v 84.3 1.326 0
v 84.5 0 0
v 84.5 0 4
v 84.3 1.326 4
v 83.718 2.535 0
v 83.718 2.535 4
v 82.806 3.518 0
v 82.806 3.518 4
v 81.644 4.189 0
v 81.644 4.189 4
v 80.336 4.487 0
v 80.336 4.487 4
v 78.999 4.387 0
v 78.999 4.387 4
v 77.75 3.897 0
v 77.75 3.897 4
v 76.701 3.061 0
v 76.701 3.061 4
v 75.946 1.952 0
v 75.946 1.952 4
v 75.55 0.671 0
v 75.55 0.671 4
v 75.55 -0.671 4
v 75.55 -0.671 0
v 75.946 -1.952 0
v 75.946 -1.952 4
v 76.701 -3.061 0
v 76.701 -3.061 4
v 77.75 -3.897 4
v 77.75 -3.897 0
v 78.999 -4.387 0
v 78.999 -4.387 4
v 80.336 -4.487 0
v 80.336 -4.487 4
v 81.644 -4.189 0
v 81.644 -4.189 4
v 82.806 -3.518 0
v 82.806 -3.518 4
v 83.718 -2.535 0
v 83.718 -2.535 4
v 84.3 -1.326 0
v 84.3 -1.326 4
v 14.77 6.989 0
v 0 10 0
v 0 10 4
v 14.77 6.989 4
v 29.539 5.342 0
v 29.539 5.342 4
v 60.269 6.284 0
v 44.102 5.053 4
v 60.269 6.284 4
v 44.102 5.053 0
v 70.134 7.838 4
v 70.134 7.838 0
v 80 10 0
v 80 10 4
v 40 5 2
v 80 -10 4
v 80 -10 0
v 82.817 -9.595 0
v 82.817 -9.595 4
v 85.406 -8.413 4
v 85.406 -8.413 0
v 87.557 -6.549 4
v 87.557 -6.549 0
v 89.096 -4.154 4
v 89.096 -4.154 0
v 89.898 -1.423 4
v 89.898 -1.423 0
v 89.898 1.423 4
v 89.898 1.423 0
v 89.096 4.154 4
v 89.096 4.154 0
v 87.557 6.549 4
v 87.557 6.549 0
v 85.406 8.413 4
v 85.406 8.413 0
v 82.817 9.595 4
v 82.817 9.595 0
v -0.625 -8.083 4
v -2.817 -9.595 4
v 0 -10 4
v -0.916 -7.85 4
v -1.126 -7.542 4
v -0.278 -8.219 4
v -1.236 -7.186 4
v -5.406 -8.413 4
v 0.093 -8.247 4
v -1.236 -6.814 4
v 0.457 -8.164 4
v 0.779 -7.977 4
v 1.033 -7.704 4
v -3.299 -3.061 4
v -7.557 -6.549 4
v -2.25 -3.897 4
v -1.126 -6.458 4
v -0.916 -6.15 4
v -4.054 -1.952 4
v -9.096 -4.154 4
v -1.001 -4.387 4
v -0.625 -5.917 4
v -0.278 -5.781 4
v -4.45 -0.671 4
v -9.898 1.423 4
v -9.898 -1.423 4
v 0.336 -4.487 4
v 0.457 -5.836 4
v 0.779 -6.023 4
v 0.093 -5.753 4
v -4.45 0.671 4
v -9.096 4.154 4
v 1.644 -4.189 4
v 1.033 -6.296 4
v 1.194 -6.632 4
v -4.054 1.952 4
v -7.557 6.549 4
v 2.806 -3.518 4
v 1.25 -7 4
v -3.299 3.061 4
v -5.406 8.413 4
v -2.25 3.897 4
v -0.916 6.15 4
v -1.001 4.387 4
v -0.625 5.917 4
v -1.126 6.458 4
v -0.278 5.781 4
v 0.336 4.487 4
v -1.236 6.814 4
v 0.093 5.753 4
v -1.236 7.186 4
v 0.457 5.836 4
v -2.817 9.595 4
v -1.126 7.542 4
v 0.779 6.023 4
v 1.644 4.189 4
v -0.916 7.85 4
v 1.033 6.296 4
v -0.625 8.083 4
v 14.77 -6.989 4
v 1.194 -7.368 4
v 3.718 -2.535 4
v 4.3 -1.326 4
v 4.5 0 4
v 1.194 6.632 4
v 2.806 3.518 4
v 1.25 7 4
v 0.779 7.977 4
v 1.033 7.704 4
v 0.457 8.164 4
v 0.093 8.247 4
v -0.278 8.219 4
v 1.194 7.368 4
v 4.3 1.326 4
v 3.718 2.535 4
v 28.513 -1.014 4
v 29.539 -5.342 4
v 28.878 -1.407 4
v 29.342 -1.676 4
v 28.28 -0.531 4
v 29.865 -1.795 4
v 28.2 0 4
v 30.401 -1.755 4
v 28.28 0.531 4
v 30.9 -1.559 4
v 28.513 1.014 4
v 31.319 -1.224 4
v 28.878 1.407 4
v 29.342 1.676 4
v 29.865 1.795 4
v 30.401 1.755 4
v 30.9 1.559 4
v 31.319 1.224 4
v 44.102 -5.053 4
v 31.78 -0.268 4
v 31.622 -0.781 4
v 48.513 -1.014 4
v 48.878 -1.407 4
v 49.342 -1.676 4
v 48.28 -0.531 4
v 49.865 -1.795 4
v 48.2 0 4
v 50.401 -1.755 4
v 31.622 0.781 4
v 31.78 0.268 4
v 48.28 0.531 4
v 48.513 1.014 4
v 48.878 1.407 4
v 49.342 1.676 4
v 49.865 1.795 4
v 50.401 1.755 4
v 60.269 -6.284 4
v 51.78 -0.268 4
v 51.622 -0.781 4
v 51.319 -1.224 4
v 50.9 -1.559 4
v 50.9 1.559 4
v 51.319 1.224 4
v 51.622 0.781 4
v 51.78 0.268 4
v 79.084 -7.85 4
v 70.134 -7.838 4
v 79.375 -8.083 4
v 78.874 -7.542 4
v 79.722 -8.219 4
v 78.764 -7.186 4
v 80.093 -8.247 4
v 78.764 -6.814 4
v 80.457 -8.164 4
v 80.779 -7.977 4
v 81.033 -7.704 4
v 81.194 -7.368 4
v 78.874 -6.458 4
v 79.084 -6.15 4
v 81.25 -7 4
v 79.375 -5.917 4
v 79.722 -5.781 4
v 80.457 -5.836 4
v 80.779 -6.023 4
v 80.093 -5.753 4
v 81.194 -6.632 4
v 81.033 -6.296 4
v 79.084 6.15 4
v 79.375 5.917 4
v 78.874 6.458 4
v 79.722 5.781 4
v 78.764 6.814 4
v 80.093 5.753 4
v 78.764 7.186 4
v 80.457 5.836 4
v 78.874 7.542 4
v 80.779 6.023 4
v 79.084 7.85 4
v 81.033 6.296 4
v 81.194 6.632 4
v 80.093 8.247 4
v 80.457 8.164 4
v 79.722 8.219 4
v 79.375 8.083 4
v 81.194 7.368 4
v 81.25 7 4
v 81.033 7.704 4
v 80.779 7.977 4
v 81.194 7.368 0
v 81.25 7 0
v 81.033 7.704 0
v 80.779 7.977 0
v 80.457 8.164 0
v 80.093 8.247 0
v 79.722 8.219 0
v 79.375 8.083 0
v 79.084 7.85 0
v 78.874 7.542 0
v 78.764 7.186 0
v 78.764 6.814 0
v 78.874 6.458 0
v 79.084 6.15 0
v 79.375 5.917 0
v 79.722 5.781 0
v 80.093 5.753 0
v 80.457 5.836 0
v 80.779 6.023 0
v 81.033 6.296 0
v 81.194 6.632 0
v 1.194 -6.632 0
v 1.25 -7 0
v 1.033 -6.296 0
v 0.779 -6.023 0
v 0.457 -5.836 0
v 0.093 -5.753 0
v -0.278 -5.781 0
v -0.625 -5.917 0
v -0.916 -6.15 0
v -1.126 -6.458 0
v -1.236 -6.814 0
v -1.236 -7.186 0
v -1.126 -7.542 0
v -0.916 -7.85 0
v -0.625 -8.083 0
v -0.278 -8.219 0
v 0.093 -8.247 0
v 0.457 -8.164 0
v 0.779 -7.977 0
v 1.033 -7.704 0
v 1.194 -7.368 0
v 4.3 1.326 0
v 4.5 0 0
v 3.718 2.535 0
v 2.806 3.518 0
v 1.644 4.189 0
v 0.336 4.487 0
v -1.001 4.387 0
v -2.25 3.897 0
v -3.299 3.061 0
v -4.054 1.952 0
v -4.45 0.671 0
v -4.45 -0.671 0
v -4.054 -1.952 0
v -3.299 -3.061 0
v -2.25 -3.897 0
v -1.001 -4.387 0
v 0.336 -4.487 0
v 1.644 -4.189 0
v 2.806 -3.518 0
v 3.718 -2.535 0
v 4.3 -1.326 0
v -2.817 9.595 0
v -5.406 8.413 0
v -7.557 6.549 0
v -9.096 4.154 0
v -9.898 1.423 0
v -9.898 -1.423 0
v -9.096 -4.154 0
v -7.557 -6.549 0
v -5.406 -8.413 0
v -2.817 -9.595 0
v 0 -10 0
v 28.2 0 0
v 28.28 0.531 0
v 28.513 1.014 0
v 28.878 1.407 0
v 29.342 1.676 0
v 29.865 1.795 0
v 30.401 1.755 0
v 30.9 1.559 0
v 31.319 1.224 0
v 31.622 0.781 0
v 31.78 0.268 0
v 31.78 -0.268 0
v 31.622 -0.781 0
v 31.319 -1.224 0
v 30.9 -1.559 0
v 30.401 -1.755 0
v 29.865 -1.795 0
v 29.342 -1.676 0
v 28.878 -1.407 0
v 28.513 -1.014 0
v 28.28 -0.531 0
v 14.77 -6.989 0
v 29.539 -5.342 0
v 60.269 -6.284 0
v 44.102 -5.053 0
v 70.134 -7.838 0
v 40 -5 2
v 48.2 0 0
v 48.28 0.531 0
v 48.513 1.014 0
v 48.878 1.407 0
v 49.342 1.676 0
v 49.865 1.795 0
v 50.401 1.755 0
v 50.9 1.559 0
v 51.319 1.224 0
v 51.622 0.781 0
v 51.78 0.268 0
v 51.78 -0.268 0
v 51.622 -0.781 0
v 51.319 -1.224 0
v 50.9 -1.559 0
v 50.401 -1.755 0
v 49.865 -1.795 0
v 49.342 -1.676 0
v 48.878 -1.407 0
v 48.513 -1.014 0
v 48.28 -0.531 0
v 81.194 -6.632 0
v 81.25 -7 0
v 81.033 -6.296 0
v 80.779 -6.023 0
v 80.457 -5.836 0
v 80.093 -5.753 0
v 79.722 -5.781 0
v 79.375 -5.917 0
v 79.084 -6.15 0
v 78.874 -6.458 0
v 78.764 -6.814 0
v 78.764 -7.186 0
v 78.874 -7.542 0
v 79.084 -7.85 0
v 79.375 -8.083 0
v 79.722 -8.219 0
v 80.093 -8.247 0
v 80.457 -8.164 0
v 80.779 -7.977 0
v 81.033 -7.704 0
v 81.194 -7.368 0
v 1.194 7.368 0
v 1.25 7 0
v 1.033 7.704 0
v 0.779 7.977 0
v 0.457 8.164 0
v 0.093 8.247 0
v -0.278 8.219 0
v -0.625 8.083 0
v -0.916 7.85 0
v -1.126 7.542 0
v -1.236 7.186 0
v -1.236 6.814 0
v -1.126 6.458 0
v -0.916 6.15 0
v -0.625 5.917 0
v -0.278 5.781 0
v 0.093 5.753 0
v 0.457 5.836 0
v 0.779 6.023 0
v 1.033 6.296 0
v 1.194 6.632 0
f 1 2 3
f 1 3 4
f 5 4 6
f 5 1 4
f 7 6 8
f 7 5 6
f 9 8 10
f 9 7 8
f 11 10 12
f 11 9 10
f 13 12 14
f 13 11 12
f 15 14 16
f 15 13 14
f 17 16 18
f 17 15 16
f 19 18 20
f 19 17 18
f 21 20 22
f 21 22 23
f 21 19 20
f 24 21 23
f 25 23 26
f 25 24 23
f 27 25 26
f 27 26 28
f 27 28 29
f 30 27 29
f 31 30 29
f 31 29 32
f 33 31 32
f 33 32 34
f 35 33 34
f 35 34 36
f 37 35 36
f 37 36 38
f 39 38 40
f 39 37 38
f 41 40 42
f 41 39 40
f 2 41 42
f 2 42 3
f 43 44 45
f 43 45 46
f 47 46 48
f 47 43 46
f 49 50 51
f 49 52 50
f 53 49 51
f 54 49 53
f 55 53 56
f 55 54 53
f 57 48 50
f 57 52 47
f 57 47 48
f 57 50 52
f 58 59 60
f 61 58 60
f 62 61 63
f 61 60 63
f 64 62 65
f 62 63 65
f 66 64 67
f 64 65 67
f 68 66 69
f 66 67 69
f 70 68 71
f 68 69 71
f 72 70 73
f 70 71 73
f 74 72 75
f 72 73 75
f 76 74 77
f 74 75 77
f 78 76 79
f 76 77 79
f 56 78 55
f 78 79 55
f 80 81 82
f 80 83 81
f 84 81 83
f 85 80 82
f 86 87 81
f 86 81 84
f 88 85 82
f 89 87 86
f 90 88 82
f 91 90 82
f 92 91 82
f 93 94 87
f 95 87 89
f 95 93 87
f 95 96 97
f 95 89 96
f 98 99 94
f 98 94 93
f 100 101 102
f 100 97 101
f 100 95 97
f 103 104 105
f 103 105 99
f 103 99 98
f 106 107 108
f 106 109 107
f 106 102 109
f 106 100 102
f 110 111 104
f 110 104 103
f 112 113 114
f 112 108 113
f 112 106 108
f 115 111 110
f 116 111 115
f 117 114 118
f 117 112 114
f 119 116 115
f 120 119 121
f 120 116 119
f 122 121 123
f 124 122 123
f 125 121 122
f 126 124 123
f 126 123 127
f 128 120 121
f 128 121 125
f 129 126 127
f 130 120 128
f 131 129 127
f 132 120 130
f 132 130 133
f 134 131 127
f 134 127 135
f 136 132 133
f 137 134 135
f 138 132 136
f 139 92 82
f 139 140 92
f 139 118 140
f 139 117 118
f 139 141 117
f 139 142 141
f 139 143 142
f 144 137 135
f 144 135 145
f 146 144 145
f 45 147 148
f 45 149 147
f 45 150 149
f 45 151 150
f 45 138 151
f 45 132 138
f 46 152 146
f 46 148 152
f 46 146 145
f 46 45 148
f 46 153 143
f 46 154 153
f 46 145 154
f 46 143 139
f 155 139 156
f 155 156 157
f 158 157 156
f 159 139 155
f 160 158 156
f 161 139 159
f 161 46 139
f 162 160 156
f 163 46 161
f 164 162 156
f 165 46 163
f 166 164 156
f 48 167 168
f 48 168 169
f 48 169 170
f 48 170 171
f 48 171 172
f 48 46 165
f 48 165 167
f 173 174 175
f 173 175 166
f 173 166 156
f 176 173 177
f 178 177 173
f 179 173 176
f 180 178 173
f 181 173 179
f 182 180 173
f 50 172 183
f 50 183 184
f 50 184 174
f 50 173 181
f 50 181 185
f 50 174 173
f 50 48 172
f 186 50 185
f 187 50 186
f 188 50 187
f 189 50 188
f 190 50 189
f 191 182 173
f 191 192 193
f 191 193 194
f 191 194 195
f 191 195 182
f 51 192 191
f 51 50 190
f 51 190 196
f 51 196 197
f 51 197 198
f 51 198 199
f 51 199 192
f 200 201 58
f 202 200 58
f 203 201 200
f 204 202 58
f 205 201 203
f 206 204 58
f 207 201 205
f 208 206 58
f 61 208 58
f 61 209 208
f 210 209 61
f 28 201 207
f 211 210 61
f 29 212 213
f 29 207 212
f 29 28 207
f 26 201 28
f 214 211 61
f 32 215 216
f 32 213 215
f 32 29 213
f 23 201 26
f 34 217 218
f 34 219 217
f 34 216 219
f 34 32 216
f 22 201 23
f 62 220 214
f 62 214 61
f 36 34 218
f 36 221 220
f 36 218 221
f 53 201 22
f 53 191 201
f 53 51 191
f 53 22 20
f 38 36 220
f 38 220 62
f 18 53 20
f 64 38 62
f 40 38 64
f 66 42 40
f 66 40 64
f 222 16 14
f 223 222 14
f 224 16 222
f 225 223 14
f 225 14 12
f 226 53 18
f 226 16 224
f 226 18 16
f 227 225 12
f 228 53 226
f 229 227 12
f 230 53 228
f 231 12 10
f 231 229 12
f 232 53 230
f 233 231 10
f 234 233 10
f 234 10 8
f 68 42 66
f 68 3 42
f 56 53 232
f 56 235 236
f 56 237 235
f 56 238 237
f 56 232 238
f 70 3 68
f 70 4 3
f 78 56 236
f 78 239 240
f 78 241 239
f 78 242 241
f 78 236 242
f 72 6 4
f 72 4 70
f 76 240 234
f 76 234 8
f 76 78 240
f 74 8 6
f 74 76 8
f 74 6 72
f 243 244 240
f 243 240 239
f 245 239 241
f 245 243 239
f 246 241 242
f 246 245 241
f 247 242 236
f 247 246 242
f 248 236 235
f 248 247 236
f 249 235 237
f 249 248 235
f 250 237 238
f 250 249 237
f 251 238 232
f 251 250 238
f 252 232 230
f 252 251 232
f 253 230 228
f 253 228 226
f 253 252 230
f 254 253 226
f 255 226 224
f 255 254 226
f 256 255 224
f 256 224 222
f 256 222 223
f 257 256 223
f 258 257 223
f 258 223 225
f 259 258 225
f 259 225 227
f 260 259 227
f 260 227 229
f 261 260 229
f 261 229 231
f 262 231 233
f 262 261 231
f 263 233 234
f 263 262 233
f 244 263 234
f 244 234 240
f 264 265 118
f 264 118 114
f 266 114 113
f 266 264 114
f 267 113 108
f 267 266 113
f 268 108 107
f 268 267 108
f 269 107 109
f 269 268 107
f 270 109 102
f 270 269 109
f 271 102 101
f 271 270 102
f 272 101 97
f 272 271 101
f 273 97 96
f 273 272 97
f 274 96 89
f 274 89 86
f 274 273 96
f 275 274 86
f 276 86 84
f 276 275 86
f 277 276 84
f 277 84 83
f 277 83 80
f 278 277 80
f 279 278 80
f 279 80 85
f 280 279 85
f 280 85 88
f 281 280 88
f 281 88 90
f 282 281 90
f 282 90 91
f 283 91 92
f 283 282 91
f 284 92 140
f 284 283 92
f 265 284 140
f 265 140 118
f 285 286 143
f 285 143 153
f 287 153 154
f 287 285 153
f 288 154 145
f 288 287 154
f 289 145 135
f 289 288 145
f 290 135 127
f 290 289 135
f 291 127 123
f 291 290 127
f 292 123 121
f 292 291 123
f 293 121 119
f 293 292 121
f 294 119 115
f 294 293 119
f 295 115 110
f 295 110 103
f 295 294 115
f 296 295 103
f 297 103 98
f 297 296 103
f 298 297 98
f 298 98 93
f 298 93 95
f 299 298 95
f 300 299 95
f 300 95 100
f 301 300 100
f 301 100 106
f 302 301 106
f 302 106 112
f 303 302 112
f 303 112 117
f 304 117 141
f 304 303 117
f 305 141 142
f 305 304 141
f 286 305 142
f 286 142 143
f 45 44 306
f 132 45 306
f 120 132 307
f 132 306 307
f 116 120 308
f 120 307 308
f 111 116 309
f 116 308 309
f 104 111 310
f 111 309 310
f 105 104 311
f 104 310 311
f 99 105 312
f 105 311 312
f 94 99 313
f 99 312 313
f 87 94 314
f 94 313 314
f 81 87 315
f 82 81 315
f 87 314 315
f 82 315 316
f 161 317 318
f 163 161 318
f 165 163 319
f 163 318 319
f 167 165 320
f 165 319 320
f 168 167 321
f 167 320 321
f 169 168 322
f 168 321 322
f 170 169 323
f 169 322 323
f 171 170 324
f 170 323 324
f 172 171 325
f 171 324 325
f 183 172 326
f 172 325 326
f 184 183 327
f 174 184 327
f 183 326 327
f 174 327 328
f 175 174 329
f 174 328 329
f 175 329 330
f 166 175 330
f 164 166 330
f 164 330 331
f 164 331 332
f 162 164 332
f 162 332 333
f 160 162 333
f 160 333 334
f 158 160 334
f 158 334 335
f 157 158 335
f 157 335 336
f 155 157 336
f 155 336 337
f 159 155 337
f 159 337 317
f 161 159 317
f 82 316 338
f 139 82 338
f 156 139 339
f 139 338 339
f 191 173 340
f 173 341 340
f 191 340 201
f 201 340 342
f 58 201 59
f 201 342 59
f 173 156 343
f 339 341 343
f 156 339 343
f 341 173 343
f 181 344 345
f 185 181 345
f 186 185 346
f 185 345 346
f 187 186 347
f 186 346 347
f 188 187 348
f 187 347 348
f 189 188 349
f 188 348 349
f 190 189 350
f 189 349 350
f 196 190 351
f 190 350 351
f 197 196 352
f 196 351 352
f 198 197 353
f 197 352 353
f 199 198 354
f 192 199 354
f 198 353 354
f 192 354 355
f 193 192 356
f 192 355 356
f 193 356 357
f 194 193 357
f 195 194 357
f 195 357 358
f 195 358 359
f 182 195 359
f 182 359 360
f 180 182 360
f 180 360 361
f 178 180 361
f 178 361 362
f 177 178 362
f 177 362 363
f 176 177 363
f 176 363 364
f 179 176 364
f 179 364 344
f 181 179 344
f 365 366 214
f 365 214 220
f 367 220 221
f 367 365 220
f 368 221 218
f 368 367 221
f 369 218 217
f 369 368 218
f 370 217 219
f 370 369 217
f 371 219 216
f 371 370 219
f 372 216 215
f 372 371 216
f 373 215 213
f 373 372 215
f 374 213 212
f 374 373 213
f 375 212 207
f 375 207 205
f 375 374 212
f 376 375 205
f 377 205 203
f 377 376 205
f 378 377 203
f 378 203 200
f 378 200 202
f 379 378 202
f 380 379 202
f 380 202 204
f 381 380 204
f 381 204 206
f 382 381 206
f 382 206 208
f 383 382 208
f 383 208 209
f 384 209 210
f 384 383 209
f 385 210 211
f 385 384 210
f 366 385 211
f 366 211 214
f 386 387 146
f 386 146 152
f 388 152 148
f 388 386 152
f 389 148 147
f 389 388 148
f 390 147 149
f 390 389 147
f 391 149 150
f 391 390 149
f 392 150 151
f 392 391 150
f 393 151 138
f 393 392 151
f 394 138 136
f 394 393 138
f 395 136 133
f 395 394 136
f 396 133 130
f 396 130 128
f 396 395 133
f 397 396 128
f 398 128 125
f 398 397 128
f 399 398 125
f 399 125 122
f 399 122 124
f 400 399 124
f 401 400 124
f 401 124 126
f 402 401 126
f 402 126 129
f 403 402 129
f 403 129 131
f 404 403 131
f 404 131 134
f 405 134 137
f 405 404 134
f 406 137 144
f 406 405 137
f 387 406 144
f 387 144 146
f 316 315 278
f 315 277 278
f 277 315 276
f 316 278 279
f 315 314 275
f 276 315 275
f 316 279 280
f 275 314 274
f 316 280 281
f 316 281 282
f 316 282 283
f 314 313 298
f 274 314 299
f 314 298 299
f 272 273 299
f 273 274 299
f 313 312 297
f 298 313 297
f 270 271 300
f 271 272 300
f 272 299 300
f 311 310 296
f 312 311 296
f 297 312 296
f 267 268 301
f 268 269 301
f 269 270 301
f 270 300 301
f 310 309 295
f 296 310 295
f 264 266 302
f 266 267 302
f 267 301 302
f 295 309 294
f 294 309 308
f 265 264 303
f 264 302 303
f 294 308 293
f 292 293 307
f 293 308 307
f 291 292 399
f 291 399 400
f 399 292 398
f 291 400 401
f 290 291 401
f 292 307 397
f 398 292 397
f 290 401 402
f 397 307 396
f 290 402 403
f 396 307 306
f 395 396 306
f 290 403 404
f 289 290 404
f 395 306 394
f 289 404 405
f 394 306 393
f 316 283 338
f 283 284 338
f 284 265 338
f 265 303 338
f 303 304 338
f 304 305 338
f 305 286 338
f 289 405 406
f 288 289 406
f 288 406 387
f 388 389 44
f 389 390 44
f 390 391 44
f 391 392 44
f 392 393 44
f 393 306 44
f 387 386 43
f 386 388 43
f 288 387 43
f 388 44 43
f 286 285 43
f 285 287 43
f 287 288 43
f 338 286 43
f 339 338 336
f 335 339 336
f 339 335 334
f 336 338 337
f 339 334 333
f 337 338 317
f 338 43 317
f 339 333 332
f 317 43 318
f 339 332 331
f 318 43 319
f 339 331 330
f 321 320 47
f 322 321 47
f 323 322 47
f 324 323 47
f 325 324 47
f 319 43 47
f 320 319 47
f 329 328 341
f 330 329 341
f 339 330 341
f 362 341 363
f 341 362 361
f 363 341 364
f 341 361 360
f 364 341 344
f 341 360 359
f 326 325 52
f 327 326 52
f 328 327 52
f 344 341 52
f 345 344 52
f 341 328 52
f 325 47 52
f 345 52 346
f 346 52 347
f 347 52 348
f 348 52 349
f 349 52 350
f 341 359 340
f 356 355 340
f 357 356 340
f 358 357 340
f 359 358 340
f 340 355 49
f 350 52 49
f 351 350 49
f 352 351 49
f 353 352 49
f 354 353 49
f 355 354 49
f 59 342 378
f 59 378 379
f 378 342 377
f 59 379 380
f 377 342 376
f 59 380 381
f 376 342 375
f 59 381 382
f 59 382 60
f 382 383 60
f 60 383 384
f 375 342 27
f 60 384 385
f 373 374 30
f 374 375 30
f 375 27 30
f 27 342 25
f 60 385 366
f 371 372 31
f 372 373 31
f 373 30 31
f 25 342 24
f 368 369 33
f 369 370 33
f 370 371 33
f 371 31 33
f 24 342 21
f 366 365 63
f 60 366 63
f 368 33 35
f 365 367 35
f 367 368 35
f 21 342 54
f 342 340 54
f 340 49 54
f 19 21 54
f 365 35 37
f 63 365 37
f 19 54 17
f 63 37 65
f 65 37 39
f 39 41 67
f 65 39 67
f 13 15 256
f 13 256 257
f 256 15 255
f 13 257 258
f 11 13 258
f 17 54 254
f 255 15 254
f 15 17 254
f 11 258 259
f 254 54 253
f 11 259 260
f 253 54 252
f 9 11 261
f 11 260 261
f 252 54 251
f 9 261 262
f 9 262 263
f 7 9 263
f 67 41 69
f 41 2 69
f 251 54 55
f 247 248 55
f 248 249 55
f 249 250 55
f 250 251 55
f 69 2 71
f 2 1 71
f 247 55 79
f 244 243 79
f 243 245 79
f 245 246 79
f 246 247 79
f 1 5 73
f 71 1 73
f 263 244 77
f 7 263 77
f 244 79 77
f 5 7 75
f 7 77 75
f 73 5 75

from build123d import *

# Parameters (mm, degrees)
ESQUISSE1_R             = 1.25
ESQUISSE1_R_2           = 4.5
BOSS_EXTRU_1_DEPTH      = 4
ESQUISSE2_R             = 1.8
ENL_V_MAT_EXTRU_1_DEPTH = 10


with BuildPart() as part:
    # Esquisse1 → Boss.-Extru.1 (new body)
    with BuildSketch(Plane.XY):
        with BuildLine():
            ThreePointArc((0, 10.00000024), (-10.00000024, 0), (0, -10.00000024))
            add(Edge.make_bspline(
                [(0, -10.00000024), (40, 0), (80, -10.00000024)],
                knots=[0, 0, 0, 1, 1, 1], degree=2))
            ThreePointArc((80, -10.00000024), (90.00000024, 0), (80, 10.00000024))
            add(Edge.make_bspline(
                [(0, 10.00000024), (40, 0), (80, 10.00000024)],
                knots=[0, 0, 0, 1, 1, 1], degree=2))
        make_face()
        with Locations((80, -7)):
            Circle(ESQUISSE1_R, mode=Mode.SUBTRACT)
        with Locations((80, 7)):
            Circle(ESQUISSE1_R, mode=Mode.SUBTRACT)
        with Locations((0, -7)):
            Circle(ESQUISSE1_R, mode=Mode.SUBTRACT)
        with Locations((0, 7)):
            Circle(ESQUISSE1_R, mode=Mode.SUBTRACT)
        with Locations((80, 0)):
            Circle(ESQUISSE1_R_2, mode=Mode.SUBTRACT)
        Circle(ESQUISSE1_R_2, mode=Mode.SUBTRACT)
    extrude(amount=BOSS_EXTRU_1_DEPTH)

    # Esquisse2 → Enlèv. mat.-Extru.1 (cut)
    with BuildSketch(Plane(origin=(0, 0, 0), x_dir=(-1, 0, 0), z_dir=(0, 0, -1))):
        with Locations((-50, 0)):
            Circle(ESQUISSE2_R)
        with Locations((-30, 0)):
            Circle(ESQUISSE2_R)
    extrude(amount=-ENL_V_MAT_EXTRU_1_DEPTH, mode=Mode.SUBTRACT)


solid = part.part
